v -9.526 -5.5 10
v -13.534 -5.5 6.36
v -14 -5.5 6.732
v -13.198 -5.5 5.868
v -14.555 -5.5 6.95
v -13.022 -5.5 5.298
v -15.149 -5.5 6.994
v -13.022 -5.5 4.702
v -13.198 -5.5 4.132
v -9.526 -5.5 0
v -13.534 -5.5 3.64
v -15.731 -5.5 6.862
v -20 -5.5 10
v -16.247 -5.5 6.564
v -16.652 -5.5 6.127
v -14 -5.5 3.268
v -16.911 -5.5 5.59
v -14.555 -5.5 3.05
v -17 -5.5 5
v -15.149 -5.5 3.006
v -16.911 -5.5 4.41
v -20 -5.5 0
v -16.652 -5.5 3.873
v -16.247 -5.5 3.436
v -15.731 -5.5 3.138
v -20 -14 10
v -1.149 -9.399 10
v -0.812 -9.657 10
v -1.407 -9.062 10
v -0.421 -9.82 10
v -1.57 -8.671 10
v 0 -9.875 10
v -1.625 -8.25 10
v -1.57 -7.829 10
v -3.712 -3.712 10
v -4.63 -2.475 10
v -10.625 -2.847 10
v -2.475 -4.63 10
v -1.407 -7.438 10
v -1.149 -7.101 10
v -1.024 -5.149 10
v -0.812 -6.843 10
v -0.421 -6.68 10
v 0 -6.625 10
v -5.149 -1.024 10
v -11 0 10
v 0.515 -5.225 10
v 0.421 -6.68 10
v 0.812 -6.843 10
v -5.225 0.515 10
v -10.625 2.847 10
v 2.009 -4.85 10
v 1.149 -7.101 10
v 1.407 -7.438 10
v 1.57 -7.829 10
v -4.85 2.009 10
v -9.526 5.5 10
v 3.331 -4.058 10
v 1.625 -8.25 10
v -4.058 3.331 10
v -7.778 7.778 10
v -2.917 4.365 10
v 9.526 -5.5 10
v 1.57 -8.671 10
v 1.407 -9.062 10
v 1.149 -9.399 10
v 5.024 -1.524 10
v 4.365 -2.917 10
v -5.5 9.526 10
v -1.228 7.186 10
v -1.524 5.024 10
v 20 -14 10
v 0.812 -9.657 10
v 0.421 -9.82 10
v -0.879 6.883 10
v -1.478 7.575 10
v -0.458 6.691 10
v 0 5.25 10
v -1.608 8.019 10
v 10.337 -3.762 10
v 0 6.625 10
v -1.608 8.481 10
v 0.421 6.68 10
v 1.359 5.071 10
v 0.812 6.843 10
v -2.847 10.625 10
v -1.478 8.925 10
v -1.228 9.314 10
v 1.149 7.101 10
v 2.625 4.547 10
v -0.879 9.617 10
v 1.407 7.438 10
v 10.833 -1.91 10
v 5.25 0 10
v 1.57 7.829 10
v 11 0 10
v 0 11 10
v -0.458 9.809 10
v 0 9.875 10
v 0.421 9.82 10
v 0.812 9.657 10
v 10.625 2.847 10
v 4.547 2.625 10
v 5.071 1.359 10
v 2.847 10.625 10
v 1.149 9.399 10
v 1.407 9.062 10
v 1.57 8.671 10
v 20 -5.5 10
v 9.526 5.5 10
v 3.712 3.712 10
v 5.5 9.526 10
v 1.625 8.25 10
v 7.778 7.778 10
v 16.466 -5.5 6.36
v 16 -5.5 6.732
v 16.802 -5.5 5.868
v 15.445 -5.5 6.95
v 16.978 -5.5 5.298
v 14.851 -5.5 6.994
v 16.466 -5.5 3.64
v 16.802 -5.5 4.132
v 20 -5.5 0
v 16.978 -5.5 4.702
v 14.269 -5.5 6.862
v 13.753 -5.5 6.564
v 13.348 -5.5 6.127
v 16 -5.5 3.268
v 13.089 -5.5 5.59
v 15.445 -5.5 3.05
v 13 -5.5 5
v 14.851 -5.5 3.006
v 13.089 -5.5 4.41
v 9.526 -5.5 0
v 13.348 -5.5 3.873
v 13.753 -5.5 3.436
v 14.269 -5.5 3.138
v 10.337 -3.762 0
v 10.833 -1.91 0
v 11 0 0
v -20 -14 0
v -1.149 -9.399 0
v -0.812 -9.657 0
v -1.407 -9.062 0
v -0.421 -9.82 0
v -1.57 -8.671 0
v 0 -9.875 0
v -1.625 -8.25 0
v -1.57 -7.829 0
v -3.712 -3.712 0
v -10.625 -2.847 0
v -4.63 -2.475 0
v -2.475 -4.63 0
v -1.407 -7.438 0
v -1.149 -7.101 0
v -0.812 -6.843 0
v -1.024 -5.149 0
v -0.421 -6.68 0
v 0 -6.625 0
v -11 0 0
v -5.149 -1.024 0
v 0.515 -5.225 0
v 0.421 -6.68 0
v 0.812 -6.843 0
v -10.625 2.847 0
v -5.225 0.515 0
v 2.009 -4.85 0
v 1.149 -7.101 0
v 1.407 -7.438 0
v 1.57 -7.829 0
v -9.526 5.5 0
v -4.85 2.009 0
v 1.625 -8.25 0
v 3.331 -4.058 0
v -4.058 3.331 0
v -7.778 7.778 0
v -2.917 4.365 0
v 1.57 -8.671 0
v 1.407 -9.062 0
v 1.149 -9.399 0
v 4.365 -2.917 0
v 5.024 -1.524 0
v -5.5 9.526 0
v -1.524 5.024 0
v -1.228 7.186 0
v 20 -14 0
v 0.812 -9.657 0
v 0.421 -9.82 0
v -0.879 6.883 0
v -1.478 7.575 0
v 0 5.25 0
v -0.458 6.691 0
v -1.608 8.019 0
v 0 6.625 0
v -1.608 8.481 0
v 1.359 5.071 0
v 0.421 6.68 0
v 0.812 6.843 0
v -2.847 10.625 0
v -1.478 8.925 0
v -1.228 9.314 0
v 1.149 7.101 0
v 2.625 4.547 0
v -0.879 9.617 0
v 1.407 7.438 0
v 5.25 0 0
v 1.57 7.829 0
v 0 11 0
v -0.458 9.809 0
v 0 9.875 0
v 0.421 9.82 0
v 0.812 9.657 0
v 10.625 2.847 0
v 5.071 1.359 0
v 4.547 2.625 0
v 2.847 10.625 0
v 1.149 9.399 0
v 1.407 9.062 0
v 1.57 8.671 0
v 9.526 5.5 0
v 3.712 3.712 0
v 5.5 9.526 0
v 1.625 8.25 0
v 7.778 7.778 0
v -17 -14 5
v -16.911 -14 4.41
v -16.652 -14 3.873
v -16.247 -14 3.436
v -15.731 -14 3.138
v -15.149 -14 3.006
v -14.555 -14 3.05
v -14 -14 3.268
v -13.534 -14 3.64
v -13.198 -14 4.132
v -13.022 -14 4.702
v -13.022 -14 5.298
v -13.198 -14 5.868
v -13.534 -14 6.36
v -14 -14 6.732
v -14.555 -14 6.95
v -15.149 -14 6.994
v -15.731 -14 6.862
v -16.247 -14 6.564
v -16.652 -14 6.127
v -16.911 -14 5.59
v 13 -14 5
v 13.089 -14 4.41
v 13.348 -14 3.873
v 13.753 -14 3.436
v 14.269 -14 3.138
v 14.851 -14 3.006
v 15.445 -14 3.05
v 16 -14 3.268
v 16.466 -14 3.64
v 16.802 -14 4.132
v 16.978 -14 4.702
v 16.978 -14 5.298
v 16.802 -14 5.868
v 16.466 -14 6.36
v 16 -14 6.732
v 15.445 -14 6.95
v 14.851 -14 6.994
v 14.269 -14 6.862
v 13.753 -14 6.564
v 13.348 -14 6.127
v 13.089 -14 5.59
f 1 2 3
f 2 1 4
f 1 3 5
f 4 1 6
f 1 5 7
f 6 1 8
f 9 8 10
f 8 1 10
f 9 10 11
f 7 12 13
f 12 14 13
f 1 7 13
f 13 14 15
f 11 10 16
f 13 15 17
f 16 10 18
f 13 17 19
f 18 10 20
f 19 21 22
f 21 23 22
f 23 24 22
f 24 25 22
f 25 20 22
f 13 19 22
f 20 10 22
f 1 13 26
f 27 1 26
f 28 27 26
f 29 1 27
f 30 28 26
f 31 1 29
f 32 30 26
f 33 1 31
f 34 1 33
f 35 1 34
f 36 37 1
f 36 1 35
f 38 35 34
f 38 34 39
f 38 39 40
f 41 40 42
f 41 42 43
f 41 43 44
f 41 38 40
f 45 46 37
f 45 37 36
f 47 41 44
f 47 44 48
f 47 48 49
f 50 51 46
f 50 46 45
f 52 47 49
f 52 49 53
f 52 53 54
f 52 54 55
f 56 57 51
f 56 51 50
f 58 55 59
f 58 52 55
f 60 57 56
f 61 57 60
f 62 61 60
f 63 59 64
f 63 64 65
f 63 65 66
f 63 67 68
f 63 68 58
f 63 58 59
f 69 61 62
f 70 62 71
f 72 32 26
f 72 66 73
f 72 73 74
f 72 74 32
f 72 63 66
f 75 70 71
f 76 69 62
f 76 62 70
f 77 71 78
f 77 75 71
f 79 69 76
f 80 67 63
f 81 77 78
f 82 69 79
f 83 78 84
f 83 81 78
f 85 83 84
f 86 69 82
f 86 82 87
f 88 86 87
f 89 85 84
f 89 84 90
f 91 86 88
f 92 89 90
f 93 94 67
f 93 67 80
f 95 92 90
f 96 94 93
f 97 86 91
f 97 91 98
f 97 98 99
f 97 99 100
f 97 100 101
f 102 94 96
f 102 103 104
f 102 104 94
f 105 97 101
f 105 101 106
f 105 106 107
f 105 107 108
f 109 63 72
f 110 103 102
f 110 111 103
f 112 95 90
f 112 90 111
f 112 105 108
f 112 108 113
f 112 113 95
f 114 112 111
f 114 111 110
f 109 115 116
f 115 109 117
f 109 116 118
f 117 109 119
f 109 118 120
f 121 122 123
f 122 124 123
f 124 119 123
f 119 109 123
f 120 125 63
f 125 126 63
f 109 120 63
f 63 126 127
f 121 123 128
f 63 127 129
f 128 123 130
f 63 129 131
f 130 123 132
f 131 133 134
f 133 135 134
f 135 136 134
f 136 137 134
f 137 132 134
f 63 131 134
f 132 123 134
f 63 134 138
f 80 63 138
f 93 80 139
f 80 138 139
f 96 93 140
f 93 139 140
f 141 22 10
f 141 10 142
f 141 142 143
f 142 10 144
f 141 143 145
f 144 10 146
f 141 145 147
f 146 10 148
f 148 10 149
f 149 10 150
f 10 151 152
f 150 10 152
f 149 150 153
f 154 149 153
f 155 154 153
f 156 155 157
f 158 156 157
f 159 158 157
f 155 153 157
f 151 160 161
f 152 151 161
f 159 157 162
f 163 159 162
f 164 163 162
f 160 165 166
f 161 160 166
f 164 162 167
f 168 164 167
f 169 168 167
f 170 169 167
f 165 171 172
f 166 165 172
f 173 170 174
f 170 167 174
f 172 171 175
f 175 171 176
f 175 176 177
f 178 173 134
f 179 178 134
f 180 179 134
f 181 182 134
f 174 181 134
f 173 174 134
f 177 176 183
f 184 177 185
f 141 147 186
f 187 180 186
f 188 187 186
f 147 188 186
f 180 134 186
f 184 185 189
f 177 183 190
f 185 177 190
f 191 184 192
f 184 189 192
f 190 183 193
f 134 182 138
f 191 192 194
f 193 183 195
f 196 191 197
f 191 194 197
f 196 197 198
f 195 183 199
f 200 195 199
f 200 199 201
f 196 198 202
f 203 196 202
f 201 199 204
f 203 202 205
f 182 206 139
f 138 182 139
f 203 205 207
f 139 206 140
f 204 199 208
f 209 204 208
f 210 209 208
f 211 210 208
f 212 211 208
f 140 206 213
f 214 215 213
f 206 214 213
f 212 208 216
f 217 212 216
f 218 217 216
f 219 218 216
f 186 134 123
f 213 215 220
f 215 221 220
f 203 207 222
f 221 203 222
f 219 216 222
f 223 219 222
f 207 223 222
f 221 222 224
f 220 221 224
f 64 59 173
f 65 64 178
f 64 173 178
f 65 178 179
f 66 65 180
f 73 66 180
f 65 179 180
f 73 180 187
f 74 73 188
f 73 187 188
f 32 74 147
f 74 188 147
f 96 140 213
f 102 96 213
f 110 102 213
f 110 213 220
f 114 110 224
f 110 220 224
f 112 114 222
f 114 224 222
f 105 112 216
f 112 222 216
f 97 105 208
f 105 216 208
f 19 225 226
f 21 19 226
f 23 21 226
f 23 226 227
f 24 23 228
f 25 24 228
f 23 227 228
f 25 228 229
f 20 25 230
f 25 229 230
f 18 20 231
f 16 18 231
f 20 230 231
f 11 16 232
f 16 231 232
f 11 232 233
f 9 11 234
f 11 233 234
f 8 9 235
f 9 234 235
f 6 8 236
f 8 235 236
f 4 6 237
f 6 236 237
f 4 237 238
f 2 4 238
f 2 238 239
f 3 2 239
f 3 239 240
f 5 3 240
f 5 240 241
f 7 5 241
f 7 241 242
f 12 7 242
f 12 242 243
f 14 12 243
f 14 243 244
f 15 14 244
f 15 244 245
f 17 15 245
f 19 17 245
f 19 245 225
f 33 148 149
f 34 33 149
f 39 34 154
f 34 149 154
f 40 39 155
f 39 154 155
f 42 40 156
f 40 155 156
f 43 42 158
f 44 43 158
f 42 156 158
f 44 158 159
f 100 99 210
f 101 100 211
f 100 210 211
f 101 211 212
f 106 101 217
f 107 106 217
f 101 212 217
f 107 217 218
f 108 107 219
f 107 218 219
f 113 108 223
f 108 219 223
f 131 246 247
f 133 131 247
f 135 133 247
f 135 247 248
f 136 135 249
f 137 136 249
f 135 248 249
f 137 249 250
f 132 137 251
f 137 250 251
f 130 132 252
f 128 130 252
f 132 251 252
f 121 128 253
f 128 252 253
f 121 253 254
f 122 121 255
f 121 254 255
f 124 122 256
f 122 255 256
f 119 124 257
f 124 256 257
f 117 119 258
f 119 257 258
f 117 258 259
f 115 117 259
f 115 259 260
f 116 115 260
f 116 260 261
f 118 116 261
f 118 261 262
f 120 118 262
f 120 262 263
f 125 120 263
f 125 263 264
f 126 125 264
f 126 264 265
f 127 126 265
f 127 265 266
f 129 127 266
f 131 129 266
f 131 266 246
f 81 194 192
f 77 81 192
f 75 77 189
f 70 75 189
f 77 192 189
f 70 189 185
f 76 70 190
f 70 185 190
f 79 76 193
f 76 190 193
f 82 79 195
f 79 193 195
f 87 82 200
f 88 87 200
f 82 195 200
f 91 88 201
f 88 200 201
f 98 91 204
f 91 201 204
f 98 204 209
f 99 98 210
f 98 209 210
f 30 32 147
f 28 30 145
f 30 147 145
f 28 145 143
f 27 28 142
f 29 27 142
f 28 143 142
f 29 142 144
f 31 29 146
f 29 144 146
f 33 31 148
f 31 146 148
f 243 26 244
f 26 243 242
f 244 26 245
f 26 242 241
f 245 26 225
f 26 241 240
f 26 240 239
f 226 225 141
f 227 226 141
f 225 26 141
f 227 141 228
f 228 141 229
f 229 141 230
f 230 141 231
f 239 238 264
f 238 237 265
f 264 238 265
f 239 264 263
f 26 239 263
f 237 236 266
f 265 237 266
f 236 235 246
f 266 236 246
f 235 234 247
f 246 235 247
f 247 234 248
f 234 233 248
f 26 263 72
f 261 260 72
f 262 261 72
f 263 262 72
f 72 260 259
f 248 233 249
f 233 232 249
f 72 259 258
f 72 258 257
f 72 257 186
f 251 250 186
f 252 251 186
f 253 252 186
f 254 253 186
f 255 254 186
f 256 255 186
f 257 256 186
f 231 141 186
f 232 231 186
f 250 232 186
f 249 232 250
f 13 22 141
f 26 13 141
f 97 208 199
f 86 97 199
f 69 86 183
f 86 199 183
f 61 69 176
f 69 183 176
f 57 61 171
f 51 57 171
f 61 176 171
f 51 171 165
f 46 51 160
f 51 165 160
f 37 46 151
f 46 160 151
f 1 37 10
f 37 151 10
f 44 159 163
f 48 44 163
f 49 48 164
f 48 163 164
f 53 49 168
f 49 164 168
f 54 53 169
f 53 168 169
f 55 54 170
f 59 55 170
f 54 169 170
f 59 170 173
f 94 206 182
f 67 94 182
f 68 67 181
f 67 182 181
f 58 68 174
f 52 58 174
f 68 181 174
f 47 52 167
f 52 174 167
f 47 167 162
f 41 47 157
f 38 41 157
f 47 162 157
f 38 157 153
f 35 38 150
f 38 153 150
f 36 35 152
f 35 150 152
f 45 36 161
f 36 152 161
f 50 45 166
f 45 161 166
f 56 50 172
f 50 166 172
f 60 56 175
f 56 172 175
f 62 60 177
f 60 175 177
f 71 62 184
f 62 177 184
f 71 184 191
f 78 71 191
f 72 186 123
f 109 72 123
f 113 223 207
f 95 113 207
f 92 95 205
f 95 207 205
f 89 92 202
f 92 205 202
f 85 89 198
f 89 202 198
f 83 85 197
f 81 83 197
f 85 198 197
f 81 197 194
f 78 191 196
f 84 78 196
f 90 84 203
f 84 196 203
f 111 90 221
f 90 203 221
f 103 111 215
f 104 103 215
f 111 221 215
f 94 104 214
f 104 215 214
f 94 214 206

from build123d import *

# Parameters (mm, degrees)
F1_DEPTH = 10
F3_DEPTH = 10


with BuildPart() as f1:
    # F0 (on Top) → F1 (new body)
    with BuildSketch(Plane.XY):
        with BuildLine():
            ThreePointArc((-7.2758161054, -8.25), (-8.5128273031, -6.966474812), (-9.5262794416, -5.5))
            Line((-9.5262794416, -5.5), (-20, -5.5))
            Line((-20, -5.5), (-20, -8.25))
            Line((-20, -8.25), (-7.2758161054, -8.25))
        make_face()
        with BuildLine():
            ThreePointArc((0, -11), (-3.8890872965, -10.2895578136), (-7.2758161054, -8.25))
            Line((-7.2758161054, -8.25), (-20, -8.25))
            Line((-20, -8.25), (-20, -11))
            Line((-20, -11), (0, -11))
        make_face()
        with BuildLine():
            Line((0, -5.5), (-9.5262794416, -5.5))
            ThreePointArc((-9.5262794416, -5.5), (-8.5128273031, -6.966474812), (-7.2758161054, -8.25))
            Line((-7.2758161054, -8.25), (-1.625, -8.25))
            ThreePointArc((-1.625, -8.25), (-1.1490485194, -7.1009514806), (0, -6.625))
            Line((0, -6.625), (0, -5.5))
        make_face()
        with BuildLine():
            Line((-1.625, -8.25), (-7.2758161054, -8.25))
            ThreePointArc((-7.2758161054, -8.25), (-3.8890872965, -10.2895578136), (0, -11))
            Line((0, -11), (0, -9.875))
            ThreePointArc((0, -9.875), (-1.1490485194, -9.3990485194), (-1.625, -8.25))
        make_face()
        with BuildLine():
            ThreePointArc((0, -11), (3.8890872965, -10.2895578136), (7.2758161054, -8.25))
            Line((7.2758161054, -8.25), (1.625, -8.25))
            ThreePointArc((1.625, -8.25), (1.1490485194, -9.3990485194), (0, -9.875))
            Line((0, -9.875), (0, -11))
        make_face()
        with BuildLine():
            ThreePointArc((7.2758161054, -8.25), (8.5128273031, -6.966474812), (9.5262794416, -5.5))
            Line((9.5262794416, -5.5), (0, -5.5))
            Line((0, -5.5), (0, -6.625))
            ThreePointArc((0, -6.625), (1.1490485194, -7.1009514806), (1.625, -8.25))
            Line((1.625, -8.25), (7.2758161054, -8.25))
        make_face()
        with BuildLine():
            Line((20, -5.5), (9.5262794416, -5.5))
            ThreePointArc((9.5262794416, -5.5), (8.5128273031, -6.966474812), (7.2758161054, -8.25))
            Line((7.2758161054, -8.25), (20, -8.25))
            Line((20, -8.25), (20, -5.5))
        make_face()
        with BuildLine():
            Line((20, -8.25), (7.2758161054, -8.25))
            ThreePointArc((7.2758161054, -8.25), (3.8890872965, -10.2895578136), (0, -11))
            Line((0, -11), (20, -11))
            Line((20, -11), (20, -8.25))
        make_face()
        with BuildLine():
            ThreePointArc((9.5262794416, -5.5), (10.6251840892, -2.8470094961), (11, 0))
            Line((11, 0), (5.25, 0))
            ThreePointArc((5.25, 0), (-3.7123106012, -3.7123106012), (0, 5.25))
            Line((0, 5.25), (0, 5.5))
            Line((0, 5.5), (0, 6.625))
            ThreePointArc((0, 6.625), (-1.625, 8.25), (0, 9.875))
            Line((0, 9.875), (0, 11))
            ThreePointArc((0, 11), (-9.5262794416, 5.5), (-9.5262794416, -5.5))
            Line((-9.5262794416, -5.5), (0, -5.5))
            Line((0, -5.5), (9.5262794416, -5.5))
        make_face()
        with BuildLine():
            Line((5.25, 0), (11, 0))
            ThreePointArc((11, 0), (7.7781745931, 7.7781745931), (0, 11))
            Line((0, 11), (0, 9.875))
            ThreePointArc((0, 9.875), (1.1490485194, 9.3990485194), (1.625, 8.25))
            ThreePointArc((1.625, 8.25), (1.1490485194, 7.1009514806), (0, 6.625))
            Line((0, 6.625), (0, 5.5))
            Line((0, 5.5), (0, 5.25))
            ThreePointArc((0, 5.25), (3.7123106012, 3.7123106012), (5.25, 0))
        make_face()
        Polygon((20, -11), (0, -11), (-20, -11), (-20, -14), (20, -14), align=None)
    extrude(amount=F1_DEPTH)

    # F2 (on face) → F3 (cut)
    with BuildSketch(Plane.XZ.offset(14)):
        with BuildLine():
            Line((-17, 5), (-13, 5))
            ThreePointArc((-13, 5), (-15, 7), (-17, 5))
        make_face()
        with BuildLine():
            ThreePointArc((-17, 5), (-15, 3), (-13, 5))
            Line((-13, 5), (-17, 5))
        make_face()
        with BuildLine():
            Line((13, 5), (17, 5))
            ThreePointArc((17, 5), (15, 7), (13, 5))
        make_face()
        with BuildLine():
            ThreePointArc((13, 5), (15, 3), (17, 5))
            Line((17, 5), (13, 5))
        make_face()
    extrude(amount=-F3_DEPTH, mode=Mode.SUBTRACT)


solid = f1.part
